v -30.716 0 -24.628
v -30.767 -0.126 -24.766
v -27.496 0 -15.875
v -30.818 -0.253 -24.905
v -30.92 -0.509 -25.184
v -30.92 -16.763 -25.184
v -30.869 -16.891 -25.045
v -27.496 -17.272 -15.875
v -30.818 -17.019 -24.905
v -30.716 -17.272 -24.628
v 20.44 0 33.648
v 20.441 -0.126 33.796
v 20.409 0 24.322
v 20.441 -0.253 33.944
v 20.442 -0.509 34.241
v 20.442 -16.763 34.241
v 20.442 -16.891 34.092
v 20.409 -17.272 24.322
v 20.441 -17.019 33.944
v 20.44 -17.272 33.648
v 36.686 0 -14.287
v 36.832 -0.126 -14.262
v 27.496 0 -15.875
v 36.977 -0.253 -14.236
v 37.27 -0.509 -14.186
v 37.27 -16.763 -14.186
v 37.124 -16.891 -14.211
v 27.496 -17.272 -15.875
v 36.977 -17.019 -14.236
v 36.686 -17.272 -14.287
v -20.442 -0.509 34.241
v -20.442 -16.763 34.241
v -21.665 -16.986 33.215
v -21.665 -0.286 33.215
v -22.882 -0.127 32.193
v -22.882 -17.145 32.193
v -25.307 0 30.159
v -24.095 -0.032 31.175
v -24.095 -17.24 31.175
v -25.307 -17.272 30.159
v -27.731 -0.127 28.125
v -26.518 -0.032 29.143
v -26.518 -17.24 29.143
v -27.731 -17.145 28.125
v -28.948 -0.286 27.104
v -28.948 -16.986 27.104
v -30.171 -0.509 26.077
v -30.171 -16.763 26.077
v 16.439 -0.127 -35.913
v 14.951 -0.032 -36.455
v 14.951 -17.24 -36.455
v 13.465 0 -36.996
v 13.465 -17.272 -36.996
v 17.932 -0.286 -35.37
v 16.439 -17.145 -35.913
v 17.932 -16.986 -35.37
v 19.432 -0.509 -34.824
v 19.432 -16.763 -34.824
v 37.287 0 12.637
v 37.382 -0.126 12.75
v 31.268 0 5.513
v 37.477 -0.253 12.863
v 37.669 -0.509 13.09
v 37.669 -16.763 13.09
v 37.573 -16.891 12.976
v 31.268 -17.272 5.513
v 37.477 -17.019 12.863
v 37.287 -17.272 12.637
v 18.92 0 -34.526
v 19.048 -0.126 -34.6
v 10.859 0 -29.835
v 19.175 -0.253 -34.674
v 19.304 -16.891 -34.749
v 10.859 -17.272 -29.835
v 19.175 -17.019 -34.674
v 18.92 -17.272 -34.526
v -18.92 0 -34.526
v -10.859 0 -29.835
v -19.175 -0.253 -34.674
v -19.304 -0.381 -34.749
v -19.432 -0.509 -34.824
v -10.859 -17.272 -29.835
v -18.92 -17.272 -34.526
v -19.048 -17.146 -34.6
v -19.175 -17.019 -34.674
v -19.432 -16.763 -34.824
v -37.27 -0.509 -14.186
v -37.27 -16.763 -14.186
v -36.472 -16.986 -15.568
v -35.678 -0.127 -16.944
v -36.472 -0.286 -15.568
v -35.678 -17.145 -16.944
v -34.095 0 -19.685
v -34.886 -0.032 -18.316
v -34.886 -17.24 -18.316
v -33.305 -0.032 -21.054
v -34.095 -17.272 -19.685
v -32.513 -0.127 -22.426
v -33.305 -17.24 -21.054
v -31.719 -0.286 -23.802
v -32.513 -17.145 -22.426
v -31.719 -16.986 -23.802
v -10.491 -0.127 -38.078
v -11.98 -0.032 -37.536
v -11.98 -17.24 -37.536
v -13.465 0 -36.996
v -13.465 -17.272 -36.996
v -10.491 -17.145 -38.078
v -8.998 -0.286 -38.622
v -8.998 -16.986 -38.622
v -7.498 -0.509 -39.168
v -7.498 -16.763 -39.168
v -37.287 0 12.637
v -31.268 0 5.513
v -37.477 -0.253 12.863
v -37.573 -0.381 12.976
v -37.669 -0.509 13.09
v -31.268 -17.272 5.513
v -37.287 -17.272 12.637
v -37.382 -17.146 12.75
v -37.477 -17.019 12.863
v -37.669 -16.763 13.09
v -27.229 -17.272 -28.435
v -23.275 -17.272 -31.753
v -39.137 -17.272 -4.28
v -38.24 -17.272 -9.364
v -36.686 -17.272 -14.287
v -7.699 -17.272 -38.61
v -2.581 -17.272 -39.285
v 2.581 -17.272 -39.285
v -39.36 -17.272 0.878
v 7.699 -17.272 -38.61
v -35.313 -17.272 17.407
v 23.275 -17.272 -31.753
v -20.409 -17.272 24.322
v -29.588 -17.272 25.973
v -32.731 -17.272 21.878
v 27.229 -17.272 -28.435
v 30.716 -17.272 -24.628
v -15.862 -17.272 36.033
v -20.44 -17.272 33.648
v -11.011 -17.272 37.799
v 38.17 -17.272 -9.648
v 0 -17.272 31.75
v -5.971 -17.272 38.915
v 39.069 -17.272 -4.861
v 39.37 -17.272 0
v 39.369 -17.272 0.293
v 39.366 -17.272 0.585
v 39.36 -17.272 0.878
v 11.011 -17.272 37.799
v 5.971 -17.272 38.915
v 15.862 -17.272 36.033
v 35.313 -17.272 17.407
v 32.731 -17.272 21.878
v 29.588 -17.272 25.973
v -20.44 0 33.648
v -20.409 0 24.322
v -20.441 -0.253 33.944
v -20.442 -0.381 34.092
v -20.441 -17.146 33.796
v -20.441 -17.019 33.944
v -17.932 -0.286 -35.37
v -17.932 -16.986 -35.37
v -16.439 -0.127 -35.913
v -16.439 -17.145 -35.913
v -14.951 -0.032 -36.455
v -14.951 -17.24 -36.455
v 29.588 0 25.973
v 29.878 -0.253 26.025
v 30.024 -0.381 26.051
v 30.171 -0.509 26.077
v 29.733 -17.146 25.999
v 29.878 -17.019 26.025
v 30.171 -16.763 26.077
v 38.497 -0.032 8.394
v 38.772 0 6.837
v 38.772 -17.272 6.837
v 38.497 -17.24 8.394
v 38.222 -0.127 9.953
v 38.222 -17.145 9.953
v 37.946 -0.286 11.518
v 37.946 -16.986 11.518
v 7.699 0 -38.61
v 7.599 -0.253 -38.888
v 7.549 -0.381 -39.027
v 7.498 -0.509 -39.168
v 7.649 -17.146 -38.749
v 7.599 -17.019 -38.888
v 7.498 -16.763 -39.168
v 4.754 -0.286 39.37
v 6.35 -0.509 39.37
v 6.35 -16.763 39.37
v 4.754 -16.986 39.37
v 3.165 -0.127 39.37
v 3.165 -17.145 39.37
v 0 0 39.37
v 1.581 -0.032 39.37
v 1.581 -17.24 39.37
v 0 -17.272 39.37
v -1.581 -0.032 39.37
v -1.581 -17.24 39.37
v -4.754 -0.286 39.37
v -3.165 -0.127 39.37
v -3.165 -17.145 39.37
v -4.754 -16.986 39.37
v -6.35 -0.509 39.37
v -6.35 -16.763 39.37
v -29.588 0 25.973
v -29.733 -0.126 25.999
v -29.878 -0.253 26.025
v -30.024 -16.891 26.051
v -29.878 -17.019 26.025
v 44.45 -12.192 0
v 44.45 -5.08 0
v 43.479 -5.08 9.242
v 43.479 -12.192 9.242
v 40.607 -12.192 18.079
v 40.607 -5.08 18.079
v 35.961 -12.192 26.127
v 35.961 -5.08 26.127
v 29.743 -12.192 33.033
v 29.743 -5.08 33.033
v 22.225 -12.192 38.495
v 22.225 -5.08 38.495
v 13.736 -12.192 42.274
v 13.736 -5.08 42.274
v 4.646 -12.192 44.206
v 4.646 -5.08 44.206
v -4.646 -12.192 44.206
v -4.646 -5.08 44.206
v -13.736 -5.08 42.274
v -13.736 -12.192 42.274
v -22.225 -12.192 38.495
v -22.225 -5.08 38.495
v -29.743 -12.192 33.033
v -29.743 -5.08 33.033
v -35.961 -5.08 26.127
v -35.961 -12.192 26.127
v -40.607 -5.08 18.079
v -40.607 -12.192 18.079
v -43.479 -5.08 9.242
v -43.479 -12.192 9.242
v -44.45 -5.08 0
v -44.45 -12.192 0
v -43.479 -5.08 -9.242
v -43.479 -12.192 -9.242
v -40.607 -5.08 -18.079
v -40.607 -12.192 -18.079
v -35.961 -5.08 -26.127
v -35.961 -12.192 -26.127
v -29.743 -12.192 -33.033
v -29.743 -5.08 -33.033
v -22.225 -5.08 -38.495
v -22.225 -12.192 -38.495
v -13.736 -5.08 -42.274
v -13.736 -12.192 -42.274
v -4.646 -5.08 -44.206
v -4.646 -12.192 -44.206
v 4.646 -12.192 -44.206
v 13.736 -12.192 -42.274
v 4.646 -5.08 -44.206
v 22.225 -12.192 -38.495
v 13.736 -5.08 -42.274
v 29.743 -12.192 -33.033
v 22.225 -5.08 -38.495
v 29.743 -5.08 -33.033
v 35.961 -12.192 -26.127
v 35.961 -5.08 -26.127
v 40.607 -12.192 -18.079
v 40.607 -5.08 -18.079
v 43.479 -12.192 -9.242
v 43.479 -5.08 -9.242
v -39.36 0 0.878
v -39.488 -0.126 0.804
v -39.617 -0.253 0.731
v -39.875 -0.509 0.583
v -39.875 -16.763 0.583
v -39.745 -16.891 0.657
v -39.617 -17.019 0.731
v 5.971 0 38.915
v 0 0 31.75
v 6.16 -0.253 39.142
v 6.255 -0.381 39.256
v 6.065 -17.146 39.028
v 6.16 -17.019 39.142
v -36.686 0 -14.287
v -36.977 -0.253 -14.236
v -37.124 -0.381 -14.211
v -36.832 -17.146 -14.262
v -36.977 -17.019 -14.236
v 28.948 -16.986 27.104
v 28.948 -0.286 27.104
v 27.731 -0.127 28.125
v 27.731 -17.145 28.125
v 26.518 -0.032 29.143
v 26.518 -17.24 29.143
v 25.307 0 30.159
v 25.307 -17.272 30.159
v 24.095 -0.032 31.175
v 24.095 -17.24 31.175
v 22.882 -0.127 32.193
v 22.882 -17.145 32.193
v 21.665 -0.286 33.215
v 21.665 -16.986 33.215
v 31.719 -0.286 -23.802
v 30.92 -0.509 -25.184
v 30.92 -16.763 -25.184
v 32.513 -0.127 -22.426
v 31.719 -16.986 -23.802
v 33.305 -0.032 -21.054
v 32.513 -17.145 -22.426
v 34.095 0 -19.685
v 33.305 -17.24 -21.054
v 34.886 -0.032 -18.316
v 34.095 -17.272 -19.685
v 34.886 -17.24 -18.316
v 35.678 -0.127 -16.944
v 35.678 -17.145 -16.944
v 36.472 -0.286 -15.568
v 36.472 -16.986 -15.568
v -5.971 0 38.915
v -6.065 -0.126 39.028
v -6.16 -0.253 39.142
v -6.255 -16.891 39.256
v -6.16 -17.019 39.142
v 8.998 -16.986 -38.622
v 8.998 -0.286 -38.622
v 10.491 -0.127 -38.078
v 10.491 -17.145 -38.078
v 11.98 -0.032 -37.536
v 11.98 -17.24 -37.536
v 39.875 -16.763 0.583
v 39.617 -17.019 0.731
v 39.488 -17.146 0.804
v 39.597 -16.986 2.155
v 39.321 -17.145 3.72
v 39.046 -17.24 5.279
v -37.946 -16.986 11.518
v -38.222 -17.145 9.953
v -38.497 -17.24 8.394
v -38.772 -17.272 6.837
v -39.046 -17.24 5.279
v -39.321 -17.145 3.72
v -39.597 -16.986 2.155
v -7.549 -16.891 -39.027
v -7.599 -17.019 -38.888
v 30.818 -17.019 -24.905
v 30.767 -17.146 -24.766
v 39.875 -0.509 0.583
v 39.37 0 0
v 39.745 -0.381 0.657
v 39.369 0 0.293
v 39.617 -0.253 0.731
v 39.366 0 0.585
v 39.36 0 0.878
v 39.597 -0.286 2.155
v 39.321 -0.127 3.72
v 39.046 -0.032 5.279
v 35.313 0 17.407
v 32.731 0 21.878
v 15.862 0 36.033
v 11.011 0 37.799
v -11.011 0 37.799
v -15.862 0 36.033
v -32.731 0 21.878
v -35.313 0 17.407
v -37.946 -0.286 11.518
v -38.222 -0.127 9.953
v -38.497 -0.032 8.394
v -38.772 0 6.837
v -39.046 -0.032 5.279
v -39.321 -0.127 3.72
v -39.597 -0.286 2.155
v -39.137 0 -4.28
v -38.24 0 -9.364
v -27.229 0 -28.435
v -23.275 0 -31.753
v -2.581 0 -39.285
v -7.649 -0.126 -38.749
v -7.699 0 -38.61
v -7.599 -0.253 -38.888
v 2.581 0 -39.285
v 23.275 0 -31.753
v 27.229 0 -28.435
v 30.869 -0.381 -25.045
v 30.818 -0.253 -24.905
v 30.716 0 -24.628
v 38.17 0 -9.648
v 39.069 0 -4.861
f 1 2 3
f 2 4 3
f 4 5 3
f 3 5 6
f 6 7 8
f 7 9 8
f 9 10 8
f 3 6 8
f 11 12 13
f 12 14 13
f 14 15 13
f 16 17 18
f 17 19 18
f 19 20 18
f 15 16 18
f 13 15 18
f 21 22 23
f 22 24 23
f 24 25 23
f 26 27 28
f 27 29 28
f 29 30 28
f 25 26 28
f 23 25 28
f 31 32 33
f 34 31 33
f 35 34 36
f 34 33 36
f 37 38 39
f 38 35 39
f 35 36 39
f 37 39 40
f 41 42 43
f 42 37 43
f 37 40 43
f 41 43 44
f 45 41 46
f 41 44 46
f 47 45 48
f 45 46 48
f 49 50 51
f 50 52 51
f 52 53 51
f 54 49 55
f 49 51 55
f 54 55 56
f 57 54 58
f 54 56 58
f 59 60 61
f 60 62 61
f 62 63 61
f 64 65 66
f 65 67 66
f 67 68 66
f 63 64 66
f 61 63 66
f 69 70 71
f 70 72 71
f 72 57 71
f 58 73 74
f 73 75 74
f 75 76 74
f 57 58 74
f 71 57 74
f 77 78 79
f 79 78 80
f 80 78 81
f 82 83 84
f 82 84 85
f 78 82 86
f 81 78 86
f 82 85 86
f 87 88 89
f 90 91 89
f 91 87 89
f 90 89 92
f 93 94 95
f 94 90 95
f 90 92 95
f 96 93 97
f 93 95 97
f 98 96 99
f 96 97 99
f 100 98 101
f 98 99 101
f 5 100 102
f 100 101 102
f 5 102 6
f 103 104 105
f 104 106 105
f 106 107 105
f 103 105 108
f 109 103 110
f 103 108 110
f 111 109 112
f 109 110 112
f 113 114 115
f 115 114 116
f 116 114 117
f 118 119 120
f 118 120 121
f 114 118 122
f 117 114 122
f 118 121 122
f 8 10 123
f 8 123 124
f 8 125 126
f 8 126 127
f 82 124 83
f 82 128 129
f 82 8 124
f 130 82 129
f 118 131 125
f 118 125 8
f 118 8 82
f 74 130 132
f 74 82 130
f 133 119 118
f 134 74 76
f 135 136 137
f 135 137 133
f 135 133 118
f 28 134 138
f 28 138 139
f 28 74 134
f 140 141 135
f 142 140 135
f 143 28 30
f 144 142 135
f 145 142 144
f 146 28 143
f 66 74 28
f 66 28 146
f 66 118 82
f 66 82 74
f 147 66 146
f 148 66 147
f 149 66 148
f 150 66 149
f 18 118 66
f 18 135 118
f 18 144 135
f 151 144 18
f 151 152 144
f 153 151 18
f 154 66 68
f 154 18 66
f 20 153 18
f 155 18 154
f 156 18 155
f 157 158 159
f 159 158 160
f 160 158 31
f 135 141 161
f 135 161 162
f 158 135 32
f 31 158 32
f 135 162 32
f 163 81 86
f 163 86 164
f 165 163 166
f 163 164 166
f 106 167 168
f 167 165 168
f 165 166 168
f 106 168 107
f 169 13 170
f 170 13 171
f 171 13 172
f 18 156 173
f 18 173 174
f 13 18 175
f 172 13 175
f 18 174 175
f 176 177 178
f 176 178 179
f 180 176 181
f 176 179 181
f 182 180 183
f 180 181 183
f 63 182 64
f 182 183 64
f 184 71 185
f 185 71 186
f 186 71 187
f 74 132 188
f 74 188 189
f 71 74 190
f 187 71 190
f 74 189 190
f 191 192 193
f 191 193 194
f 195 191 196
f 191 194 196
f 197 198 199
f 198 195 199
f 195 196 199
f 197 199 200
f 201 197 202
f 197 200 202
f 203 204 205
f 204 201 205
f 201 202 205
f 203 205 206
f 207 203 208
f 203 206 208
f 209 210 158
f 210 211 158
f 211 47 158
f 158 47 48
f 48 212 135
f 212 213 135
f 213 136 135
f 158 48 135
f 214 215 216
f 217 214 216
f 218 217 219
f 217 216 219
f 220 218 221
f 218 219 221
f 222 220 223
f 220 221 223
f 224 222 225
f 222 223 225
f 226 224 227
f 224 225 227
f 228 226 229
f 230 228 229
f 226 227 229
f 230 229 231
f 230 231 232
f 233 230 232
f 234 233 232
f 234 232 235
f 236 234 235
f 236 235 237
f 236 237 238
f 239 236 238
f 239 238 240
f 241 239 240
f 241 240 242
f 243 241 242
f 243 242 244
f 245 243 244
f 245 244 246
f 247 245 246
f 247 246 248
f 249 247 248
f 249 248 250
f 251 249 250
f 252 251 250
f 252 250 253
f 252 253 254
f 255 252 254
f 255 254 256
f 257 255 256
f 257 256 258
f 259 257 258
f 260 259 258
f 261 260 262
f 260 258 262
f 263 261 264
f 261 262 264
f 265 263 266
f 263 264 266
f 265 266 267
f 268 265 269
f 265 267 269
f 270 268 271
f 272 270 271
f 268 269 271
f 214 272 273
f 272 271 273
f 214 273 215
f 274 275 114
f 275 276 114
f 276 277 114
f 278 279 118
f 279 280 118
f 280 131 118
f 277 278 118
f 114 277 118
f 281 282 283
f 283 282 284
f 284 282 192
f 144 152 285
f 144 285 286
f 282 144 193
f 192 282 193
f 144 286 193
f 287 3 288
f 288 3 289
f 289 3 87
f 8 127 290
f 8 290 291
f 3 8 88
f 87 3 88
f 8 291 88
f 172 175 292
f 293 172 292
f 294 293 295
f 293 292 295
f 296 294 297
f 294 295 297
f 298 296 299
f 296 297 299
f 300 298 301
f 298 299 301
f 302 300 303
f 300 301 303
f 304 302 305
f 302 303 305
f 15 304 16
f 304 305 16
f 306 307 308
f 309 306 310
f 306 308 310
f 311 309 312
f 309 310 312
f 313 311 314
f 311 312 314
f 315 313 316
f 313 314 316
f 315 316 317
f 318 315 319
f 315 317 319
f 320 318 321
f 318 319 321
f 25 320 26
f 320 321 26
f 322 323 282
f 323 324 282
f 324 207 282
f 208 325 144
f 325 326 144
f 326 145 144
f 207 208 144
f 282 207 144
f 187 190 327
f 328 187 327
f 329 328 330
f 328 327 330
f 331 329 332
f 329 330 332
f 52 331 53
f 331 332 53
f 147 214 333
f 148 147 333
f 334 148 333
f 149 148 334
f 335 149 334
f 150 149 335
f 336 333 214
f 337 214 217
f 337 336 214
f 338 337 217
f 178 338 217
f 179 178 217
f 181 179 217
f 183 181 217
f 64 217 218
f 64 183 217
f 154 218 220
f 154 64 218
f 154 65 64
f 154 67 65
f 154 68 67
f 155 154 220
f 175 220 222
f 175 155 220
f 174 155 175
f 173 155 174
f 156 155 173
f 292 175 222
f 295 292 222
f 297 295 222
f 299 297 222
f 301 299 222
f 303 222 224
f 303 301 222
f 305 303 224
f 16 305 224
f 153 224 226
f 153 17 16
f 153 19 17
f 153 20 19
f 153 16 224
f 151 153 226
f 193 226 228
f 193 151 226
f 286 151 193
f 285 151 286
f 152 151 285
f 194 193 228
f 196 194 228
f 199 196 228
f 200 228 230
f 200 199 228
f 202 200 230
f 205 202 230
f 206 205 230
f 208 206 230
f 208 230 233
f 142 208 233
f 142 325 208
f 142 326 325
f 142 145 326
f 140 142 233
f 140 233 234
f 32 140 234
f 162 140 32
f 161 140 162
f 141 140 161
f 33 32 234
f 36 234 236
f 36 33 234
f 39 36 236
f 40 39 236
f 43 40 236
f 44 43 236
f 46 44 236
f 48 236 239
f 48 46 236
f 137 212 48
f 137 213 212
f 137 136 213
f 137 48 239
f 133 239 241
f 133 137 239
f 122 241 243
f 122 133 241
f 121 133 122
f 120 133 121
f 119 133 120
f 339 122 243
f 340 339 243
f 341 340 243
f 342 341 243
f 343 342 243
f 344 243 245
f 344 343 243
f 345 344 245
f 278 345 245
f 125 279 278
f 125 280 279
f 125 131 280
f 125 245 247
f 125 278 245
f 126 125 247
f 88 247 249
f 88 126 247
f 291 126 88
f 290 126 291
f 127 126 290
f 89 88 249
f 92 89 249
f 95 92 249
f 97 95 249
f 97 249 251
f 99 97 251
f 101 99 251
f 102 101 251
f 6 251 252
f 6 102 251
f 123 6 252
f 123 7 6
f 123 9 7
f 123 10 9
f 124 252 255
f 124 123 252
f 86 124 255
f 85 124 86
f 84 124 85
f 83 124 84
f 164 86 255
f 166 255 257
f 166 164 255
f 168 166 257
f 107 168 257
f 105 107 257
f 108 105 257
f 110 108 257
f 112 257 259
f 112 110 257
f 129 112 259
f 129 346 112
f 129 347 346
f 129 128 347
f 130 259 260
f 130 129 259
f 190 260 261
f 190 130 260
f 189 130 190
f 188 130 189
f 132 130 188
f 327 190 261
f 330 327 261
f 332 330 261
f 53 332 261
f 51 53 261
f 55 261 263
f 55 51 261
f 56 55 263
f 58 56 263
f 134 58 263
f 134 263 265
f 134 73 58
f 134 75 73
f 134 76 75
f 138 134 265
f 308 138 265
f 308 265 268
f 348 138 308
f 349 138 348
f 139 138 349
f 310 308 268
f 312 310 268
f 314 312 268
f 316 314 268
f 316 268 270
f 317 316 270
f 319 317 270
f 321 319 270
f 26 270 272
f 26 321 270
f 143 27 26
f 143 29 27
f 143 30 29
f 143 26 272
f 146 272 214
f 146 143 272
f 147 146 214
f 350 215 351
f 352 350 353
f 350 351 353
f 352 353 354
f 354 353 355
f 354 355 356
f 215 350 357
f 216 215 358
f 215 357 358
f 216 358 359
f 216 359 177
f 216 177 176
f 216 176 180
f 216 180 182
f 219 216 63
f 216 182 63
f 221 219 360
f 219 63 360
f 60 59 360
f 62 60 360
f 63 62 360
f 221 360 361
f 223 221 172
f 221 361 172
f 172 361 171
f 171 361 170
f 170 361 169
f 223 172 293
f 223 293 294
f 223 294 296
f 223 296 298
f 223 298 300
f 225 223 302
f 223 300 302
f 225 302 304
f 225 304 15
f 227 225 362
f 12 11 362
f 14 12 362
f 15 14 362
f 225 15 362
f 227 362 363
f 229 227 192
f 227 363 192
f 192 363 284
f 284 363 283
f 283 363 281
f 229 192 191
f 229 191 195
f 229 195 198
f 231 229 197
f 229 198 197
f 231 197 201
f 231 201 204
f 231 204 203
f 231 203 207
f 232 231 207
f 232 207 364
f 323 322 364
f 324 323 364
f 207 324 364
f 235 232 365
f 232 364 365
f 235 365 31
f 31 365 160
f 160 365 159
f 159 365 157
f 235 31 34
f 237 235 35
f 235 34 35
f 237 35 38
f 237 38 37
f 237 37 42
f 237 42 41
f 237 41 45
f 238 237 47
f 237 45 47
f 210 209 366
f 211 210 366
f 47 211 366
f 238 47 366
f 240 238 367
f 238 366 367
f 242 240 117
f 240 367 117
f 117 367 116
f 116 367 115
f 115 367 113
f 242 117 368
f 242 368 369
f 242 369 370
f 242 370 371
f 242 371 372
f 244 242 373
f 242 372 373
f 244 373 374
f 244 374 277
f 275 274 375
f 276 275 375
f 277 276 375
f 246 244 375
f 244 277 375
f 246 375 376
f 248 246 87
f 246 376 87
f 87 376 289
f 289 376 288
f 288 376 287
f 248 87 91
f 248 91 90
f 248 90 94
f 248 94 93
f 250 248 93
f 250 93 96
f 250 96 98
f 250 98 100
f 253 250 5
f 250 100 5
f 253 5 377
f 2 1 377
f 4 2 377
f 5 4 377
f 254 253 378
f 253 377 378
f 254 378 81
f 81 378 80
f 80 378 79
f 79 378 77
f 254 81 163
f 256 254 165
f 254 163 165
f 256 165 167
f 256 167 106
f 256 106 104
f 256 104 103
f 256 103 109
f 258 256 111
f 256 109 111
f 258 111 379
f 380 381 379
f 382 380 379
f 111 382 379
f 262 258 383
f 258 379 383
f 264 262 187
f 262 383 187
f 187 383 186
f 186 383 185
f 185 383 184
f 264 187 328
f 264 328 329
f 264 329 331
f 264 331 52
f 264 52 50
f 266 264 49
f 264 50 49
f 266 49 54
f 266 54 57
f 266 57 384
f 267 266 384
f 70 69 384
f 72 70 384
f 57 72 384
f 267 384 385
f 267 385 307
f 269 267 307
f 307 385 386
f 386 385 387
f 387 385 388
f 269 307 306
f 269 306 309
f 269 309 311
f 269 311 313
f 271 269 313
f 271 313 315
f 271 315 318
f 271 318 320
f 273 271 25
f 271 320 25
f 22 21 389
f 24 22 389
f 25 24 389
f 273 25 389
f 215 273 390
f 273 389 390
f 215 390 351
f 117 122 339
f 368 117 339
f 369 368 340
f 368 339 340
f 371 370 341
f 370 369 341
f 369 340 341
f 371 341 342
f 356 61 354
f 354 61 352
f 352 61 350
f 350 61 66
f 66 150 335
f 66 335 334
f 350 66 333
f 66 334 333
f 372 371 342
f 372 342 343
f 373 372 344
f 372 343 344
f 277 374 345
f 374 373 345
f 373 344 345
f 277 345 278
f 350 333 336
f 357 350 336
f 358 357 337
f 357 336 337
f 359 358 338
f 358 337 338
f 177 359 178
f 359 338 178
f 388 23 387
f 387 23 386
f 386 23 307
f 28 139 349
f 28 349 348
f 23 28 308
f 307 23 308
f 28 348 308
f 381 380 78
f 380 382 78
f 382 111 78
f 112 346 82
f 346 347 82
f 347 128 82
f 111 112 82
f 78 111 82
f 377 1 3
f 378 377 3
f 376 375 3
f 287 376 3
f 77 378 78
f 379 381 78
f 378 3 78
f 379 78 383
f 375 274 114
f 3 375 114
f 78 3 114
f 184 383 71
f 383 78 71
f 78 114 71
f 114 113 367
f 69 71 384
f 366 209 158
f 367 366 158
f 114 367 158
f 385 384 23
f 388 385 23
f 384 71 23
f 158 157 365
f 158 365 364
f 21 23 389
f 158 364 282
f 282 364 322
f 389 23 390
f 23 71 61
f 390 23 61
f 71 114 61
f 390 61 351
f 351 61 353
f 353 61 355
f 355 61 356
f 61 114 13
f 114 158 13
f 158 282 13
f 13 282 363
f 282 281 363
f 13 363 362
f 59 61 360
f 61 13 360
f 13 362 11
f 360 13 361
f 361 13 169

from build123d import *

# Parameters (mm, degrees)
F0_R     = 44.45
F1_DEPTH = 17.272
F3_DEPTH = 17.273


# Not quite as in the source:
# - a fillet or chamfer that OpenCascade refuses, or shapes differently, is made with other operations: its cross-section is extruded or revolved along the edge and cut away or added


with BuildPart() as f1:
    # F0 (on Front) → F1 (new body)
    with BuildSketch(Plane.XZ):
        Circle(F0_R)
    extrude(amount=F1_DEPTH)

    # F2 (on face) → F3 (cut, through all)
    with BuildSketch(Plane.XZ.offset(17.272)):
        Polygon((6.35, 39.37), (0, 39.37), (-6.35, 39.37), (0, 31.75), align=None)
        Polygon((-20.4085066075, 24.321911069), (-20.4421659796, 34.2408710471), (-25.3065481934, 30.1591697256), (-30.1709304072, 26.0774684041), align=None)
        Polygon((-31.2676461581, 5.5133296409), (-37.6692153079, 13.0900579864), (-38.7718812361, 6.8365287547), (-39.8745471643, 0.5829995231), align=None)
        Polygon((-27.4963065702, -15.875), (-37.270420147, -14.185738686), (-34.095420147, -19.685), (-30.920420147, -25.184261314), align=None)
        Polygon((-10.8591395506, -29.83524071), (-19.4323811847, -34.8238705702), (-13.4653330427, -36.9956984803), (-7.4982849007, -39.1675263905), align=None)
        Polygon((10.8591395506, -29.83524071), (7.4982849007, -39.1675263905), (13.4653330427, -36.9956984803), (19.4323811847, -34.8238705702), align=None)
        Polygon((27.4963065702, -15.875), (30.920420147, -25.184261314), (34.095420147, -19.685), (37.270420147, -14.185738686), align=None)
        Polygon((31.2676461581, 5.5133296409), (39.8745471643, 0.5829995231), (38.7718812361, 6.8365287547), (37.6692153079, 13.0900579864), align=None)
        Polygon((20.4085066075, 24.321911069), (30.1709304072, 26.0774684041), (25.3065481934, 30.1591697256), (20.4421659796, 34.2408710471), align=None)
    extrude(amount=-F3_DEPTH, mode=Mode.SUBTRACT)

    # F4: chamfer of 5.08 on 2 edges, made by hand

    # F4_s1 → F4_t2 (revolve, cut)
    with BuildSketch(Plane.XY):
        Polygon((44.45, -12.192), (39.37, -17.272), (44.45, -17.272), align=None)
    revolve(axis=Axis((0, -17.272, 0), (0, -1, 0)), mode=Mode.SUBTRACT)

    # F4_s3 → F4_t4 (revolve, cut)
    with BuildSketch(Plane.XY):
        Polygon((44.45, -5.08), (39.37, 0), (44.45, 0), align=None)
    revolve(axis=Axis((0, 0, 0), (0, -1, 0)), mode=Mode.SUBTRACT)


solid = f1.part
